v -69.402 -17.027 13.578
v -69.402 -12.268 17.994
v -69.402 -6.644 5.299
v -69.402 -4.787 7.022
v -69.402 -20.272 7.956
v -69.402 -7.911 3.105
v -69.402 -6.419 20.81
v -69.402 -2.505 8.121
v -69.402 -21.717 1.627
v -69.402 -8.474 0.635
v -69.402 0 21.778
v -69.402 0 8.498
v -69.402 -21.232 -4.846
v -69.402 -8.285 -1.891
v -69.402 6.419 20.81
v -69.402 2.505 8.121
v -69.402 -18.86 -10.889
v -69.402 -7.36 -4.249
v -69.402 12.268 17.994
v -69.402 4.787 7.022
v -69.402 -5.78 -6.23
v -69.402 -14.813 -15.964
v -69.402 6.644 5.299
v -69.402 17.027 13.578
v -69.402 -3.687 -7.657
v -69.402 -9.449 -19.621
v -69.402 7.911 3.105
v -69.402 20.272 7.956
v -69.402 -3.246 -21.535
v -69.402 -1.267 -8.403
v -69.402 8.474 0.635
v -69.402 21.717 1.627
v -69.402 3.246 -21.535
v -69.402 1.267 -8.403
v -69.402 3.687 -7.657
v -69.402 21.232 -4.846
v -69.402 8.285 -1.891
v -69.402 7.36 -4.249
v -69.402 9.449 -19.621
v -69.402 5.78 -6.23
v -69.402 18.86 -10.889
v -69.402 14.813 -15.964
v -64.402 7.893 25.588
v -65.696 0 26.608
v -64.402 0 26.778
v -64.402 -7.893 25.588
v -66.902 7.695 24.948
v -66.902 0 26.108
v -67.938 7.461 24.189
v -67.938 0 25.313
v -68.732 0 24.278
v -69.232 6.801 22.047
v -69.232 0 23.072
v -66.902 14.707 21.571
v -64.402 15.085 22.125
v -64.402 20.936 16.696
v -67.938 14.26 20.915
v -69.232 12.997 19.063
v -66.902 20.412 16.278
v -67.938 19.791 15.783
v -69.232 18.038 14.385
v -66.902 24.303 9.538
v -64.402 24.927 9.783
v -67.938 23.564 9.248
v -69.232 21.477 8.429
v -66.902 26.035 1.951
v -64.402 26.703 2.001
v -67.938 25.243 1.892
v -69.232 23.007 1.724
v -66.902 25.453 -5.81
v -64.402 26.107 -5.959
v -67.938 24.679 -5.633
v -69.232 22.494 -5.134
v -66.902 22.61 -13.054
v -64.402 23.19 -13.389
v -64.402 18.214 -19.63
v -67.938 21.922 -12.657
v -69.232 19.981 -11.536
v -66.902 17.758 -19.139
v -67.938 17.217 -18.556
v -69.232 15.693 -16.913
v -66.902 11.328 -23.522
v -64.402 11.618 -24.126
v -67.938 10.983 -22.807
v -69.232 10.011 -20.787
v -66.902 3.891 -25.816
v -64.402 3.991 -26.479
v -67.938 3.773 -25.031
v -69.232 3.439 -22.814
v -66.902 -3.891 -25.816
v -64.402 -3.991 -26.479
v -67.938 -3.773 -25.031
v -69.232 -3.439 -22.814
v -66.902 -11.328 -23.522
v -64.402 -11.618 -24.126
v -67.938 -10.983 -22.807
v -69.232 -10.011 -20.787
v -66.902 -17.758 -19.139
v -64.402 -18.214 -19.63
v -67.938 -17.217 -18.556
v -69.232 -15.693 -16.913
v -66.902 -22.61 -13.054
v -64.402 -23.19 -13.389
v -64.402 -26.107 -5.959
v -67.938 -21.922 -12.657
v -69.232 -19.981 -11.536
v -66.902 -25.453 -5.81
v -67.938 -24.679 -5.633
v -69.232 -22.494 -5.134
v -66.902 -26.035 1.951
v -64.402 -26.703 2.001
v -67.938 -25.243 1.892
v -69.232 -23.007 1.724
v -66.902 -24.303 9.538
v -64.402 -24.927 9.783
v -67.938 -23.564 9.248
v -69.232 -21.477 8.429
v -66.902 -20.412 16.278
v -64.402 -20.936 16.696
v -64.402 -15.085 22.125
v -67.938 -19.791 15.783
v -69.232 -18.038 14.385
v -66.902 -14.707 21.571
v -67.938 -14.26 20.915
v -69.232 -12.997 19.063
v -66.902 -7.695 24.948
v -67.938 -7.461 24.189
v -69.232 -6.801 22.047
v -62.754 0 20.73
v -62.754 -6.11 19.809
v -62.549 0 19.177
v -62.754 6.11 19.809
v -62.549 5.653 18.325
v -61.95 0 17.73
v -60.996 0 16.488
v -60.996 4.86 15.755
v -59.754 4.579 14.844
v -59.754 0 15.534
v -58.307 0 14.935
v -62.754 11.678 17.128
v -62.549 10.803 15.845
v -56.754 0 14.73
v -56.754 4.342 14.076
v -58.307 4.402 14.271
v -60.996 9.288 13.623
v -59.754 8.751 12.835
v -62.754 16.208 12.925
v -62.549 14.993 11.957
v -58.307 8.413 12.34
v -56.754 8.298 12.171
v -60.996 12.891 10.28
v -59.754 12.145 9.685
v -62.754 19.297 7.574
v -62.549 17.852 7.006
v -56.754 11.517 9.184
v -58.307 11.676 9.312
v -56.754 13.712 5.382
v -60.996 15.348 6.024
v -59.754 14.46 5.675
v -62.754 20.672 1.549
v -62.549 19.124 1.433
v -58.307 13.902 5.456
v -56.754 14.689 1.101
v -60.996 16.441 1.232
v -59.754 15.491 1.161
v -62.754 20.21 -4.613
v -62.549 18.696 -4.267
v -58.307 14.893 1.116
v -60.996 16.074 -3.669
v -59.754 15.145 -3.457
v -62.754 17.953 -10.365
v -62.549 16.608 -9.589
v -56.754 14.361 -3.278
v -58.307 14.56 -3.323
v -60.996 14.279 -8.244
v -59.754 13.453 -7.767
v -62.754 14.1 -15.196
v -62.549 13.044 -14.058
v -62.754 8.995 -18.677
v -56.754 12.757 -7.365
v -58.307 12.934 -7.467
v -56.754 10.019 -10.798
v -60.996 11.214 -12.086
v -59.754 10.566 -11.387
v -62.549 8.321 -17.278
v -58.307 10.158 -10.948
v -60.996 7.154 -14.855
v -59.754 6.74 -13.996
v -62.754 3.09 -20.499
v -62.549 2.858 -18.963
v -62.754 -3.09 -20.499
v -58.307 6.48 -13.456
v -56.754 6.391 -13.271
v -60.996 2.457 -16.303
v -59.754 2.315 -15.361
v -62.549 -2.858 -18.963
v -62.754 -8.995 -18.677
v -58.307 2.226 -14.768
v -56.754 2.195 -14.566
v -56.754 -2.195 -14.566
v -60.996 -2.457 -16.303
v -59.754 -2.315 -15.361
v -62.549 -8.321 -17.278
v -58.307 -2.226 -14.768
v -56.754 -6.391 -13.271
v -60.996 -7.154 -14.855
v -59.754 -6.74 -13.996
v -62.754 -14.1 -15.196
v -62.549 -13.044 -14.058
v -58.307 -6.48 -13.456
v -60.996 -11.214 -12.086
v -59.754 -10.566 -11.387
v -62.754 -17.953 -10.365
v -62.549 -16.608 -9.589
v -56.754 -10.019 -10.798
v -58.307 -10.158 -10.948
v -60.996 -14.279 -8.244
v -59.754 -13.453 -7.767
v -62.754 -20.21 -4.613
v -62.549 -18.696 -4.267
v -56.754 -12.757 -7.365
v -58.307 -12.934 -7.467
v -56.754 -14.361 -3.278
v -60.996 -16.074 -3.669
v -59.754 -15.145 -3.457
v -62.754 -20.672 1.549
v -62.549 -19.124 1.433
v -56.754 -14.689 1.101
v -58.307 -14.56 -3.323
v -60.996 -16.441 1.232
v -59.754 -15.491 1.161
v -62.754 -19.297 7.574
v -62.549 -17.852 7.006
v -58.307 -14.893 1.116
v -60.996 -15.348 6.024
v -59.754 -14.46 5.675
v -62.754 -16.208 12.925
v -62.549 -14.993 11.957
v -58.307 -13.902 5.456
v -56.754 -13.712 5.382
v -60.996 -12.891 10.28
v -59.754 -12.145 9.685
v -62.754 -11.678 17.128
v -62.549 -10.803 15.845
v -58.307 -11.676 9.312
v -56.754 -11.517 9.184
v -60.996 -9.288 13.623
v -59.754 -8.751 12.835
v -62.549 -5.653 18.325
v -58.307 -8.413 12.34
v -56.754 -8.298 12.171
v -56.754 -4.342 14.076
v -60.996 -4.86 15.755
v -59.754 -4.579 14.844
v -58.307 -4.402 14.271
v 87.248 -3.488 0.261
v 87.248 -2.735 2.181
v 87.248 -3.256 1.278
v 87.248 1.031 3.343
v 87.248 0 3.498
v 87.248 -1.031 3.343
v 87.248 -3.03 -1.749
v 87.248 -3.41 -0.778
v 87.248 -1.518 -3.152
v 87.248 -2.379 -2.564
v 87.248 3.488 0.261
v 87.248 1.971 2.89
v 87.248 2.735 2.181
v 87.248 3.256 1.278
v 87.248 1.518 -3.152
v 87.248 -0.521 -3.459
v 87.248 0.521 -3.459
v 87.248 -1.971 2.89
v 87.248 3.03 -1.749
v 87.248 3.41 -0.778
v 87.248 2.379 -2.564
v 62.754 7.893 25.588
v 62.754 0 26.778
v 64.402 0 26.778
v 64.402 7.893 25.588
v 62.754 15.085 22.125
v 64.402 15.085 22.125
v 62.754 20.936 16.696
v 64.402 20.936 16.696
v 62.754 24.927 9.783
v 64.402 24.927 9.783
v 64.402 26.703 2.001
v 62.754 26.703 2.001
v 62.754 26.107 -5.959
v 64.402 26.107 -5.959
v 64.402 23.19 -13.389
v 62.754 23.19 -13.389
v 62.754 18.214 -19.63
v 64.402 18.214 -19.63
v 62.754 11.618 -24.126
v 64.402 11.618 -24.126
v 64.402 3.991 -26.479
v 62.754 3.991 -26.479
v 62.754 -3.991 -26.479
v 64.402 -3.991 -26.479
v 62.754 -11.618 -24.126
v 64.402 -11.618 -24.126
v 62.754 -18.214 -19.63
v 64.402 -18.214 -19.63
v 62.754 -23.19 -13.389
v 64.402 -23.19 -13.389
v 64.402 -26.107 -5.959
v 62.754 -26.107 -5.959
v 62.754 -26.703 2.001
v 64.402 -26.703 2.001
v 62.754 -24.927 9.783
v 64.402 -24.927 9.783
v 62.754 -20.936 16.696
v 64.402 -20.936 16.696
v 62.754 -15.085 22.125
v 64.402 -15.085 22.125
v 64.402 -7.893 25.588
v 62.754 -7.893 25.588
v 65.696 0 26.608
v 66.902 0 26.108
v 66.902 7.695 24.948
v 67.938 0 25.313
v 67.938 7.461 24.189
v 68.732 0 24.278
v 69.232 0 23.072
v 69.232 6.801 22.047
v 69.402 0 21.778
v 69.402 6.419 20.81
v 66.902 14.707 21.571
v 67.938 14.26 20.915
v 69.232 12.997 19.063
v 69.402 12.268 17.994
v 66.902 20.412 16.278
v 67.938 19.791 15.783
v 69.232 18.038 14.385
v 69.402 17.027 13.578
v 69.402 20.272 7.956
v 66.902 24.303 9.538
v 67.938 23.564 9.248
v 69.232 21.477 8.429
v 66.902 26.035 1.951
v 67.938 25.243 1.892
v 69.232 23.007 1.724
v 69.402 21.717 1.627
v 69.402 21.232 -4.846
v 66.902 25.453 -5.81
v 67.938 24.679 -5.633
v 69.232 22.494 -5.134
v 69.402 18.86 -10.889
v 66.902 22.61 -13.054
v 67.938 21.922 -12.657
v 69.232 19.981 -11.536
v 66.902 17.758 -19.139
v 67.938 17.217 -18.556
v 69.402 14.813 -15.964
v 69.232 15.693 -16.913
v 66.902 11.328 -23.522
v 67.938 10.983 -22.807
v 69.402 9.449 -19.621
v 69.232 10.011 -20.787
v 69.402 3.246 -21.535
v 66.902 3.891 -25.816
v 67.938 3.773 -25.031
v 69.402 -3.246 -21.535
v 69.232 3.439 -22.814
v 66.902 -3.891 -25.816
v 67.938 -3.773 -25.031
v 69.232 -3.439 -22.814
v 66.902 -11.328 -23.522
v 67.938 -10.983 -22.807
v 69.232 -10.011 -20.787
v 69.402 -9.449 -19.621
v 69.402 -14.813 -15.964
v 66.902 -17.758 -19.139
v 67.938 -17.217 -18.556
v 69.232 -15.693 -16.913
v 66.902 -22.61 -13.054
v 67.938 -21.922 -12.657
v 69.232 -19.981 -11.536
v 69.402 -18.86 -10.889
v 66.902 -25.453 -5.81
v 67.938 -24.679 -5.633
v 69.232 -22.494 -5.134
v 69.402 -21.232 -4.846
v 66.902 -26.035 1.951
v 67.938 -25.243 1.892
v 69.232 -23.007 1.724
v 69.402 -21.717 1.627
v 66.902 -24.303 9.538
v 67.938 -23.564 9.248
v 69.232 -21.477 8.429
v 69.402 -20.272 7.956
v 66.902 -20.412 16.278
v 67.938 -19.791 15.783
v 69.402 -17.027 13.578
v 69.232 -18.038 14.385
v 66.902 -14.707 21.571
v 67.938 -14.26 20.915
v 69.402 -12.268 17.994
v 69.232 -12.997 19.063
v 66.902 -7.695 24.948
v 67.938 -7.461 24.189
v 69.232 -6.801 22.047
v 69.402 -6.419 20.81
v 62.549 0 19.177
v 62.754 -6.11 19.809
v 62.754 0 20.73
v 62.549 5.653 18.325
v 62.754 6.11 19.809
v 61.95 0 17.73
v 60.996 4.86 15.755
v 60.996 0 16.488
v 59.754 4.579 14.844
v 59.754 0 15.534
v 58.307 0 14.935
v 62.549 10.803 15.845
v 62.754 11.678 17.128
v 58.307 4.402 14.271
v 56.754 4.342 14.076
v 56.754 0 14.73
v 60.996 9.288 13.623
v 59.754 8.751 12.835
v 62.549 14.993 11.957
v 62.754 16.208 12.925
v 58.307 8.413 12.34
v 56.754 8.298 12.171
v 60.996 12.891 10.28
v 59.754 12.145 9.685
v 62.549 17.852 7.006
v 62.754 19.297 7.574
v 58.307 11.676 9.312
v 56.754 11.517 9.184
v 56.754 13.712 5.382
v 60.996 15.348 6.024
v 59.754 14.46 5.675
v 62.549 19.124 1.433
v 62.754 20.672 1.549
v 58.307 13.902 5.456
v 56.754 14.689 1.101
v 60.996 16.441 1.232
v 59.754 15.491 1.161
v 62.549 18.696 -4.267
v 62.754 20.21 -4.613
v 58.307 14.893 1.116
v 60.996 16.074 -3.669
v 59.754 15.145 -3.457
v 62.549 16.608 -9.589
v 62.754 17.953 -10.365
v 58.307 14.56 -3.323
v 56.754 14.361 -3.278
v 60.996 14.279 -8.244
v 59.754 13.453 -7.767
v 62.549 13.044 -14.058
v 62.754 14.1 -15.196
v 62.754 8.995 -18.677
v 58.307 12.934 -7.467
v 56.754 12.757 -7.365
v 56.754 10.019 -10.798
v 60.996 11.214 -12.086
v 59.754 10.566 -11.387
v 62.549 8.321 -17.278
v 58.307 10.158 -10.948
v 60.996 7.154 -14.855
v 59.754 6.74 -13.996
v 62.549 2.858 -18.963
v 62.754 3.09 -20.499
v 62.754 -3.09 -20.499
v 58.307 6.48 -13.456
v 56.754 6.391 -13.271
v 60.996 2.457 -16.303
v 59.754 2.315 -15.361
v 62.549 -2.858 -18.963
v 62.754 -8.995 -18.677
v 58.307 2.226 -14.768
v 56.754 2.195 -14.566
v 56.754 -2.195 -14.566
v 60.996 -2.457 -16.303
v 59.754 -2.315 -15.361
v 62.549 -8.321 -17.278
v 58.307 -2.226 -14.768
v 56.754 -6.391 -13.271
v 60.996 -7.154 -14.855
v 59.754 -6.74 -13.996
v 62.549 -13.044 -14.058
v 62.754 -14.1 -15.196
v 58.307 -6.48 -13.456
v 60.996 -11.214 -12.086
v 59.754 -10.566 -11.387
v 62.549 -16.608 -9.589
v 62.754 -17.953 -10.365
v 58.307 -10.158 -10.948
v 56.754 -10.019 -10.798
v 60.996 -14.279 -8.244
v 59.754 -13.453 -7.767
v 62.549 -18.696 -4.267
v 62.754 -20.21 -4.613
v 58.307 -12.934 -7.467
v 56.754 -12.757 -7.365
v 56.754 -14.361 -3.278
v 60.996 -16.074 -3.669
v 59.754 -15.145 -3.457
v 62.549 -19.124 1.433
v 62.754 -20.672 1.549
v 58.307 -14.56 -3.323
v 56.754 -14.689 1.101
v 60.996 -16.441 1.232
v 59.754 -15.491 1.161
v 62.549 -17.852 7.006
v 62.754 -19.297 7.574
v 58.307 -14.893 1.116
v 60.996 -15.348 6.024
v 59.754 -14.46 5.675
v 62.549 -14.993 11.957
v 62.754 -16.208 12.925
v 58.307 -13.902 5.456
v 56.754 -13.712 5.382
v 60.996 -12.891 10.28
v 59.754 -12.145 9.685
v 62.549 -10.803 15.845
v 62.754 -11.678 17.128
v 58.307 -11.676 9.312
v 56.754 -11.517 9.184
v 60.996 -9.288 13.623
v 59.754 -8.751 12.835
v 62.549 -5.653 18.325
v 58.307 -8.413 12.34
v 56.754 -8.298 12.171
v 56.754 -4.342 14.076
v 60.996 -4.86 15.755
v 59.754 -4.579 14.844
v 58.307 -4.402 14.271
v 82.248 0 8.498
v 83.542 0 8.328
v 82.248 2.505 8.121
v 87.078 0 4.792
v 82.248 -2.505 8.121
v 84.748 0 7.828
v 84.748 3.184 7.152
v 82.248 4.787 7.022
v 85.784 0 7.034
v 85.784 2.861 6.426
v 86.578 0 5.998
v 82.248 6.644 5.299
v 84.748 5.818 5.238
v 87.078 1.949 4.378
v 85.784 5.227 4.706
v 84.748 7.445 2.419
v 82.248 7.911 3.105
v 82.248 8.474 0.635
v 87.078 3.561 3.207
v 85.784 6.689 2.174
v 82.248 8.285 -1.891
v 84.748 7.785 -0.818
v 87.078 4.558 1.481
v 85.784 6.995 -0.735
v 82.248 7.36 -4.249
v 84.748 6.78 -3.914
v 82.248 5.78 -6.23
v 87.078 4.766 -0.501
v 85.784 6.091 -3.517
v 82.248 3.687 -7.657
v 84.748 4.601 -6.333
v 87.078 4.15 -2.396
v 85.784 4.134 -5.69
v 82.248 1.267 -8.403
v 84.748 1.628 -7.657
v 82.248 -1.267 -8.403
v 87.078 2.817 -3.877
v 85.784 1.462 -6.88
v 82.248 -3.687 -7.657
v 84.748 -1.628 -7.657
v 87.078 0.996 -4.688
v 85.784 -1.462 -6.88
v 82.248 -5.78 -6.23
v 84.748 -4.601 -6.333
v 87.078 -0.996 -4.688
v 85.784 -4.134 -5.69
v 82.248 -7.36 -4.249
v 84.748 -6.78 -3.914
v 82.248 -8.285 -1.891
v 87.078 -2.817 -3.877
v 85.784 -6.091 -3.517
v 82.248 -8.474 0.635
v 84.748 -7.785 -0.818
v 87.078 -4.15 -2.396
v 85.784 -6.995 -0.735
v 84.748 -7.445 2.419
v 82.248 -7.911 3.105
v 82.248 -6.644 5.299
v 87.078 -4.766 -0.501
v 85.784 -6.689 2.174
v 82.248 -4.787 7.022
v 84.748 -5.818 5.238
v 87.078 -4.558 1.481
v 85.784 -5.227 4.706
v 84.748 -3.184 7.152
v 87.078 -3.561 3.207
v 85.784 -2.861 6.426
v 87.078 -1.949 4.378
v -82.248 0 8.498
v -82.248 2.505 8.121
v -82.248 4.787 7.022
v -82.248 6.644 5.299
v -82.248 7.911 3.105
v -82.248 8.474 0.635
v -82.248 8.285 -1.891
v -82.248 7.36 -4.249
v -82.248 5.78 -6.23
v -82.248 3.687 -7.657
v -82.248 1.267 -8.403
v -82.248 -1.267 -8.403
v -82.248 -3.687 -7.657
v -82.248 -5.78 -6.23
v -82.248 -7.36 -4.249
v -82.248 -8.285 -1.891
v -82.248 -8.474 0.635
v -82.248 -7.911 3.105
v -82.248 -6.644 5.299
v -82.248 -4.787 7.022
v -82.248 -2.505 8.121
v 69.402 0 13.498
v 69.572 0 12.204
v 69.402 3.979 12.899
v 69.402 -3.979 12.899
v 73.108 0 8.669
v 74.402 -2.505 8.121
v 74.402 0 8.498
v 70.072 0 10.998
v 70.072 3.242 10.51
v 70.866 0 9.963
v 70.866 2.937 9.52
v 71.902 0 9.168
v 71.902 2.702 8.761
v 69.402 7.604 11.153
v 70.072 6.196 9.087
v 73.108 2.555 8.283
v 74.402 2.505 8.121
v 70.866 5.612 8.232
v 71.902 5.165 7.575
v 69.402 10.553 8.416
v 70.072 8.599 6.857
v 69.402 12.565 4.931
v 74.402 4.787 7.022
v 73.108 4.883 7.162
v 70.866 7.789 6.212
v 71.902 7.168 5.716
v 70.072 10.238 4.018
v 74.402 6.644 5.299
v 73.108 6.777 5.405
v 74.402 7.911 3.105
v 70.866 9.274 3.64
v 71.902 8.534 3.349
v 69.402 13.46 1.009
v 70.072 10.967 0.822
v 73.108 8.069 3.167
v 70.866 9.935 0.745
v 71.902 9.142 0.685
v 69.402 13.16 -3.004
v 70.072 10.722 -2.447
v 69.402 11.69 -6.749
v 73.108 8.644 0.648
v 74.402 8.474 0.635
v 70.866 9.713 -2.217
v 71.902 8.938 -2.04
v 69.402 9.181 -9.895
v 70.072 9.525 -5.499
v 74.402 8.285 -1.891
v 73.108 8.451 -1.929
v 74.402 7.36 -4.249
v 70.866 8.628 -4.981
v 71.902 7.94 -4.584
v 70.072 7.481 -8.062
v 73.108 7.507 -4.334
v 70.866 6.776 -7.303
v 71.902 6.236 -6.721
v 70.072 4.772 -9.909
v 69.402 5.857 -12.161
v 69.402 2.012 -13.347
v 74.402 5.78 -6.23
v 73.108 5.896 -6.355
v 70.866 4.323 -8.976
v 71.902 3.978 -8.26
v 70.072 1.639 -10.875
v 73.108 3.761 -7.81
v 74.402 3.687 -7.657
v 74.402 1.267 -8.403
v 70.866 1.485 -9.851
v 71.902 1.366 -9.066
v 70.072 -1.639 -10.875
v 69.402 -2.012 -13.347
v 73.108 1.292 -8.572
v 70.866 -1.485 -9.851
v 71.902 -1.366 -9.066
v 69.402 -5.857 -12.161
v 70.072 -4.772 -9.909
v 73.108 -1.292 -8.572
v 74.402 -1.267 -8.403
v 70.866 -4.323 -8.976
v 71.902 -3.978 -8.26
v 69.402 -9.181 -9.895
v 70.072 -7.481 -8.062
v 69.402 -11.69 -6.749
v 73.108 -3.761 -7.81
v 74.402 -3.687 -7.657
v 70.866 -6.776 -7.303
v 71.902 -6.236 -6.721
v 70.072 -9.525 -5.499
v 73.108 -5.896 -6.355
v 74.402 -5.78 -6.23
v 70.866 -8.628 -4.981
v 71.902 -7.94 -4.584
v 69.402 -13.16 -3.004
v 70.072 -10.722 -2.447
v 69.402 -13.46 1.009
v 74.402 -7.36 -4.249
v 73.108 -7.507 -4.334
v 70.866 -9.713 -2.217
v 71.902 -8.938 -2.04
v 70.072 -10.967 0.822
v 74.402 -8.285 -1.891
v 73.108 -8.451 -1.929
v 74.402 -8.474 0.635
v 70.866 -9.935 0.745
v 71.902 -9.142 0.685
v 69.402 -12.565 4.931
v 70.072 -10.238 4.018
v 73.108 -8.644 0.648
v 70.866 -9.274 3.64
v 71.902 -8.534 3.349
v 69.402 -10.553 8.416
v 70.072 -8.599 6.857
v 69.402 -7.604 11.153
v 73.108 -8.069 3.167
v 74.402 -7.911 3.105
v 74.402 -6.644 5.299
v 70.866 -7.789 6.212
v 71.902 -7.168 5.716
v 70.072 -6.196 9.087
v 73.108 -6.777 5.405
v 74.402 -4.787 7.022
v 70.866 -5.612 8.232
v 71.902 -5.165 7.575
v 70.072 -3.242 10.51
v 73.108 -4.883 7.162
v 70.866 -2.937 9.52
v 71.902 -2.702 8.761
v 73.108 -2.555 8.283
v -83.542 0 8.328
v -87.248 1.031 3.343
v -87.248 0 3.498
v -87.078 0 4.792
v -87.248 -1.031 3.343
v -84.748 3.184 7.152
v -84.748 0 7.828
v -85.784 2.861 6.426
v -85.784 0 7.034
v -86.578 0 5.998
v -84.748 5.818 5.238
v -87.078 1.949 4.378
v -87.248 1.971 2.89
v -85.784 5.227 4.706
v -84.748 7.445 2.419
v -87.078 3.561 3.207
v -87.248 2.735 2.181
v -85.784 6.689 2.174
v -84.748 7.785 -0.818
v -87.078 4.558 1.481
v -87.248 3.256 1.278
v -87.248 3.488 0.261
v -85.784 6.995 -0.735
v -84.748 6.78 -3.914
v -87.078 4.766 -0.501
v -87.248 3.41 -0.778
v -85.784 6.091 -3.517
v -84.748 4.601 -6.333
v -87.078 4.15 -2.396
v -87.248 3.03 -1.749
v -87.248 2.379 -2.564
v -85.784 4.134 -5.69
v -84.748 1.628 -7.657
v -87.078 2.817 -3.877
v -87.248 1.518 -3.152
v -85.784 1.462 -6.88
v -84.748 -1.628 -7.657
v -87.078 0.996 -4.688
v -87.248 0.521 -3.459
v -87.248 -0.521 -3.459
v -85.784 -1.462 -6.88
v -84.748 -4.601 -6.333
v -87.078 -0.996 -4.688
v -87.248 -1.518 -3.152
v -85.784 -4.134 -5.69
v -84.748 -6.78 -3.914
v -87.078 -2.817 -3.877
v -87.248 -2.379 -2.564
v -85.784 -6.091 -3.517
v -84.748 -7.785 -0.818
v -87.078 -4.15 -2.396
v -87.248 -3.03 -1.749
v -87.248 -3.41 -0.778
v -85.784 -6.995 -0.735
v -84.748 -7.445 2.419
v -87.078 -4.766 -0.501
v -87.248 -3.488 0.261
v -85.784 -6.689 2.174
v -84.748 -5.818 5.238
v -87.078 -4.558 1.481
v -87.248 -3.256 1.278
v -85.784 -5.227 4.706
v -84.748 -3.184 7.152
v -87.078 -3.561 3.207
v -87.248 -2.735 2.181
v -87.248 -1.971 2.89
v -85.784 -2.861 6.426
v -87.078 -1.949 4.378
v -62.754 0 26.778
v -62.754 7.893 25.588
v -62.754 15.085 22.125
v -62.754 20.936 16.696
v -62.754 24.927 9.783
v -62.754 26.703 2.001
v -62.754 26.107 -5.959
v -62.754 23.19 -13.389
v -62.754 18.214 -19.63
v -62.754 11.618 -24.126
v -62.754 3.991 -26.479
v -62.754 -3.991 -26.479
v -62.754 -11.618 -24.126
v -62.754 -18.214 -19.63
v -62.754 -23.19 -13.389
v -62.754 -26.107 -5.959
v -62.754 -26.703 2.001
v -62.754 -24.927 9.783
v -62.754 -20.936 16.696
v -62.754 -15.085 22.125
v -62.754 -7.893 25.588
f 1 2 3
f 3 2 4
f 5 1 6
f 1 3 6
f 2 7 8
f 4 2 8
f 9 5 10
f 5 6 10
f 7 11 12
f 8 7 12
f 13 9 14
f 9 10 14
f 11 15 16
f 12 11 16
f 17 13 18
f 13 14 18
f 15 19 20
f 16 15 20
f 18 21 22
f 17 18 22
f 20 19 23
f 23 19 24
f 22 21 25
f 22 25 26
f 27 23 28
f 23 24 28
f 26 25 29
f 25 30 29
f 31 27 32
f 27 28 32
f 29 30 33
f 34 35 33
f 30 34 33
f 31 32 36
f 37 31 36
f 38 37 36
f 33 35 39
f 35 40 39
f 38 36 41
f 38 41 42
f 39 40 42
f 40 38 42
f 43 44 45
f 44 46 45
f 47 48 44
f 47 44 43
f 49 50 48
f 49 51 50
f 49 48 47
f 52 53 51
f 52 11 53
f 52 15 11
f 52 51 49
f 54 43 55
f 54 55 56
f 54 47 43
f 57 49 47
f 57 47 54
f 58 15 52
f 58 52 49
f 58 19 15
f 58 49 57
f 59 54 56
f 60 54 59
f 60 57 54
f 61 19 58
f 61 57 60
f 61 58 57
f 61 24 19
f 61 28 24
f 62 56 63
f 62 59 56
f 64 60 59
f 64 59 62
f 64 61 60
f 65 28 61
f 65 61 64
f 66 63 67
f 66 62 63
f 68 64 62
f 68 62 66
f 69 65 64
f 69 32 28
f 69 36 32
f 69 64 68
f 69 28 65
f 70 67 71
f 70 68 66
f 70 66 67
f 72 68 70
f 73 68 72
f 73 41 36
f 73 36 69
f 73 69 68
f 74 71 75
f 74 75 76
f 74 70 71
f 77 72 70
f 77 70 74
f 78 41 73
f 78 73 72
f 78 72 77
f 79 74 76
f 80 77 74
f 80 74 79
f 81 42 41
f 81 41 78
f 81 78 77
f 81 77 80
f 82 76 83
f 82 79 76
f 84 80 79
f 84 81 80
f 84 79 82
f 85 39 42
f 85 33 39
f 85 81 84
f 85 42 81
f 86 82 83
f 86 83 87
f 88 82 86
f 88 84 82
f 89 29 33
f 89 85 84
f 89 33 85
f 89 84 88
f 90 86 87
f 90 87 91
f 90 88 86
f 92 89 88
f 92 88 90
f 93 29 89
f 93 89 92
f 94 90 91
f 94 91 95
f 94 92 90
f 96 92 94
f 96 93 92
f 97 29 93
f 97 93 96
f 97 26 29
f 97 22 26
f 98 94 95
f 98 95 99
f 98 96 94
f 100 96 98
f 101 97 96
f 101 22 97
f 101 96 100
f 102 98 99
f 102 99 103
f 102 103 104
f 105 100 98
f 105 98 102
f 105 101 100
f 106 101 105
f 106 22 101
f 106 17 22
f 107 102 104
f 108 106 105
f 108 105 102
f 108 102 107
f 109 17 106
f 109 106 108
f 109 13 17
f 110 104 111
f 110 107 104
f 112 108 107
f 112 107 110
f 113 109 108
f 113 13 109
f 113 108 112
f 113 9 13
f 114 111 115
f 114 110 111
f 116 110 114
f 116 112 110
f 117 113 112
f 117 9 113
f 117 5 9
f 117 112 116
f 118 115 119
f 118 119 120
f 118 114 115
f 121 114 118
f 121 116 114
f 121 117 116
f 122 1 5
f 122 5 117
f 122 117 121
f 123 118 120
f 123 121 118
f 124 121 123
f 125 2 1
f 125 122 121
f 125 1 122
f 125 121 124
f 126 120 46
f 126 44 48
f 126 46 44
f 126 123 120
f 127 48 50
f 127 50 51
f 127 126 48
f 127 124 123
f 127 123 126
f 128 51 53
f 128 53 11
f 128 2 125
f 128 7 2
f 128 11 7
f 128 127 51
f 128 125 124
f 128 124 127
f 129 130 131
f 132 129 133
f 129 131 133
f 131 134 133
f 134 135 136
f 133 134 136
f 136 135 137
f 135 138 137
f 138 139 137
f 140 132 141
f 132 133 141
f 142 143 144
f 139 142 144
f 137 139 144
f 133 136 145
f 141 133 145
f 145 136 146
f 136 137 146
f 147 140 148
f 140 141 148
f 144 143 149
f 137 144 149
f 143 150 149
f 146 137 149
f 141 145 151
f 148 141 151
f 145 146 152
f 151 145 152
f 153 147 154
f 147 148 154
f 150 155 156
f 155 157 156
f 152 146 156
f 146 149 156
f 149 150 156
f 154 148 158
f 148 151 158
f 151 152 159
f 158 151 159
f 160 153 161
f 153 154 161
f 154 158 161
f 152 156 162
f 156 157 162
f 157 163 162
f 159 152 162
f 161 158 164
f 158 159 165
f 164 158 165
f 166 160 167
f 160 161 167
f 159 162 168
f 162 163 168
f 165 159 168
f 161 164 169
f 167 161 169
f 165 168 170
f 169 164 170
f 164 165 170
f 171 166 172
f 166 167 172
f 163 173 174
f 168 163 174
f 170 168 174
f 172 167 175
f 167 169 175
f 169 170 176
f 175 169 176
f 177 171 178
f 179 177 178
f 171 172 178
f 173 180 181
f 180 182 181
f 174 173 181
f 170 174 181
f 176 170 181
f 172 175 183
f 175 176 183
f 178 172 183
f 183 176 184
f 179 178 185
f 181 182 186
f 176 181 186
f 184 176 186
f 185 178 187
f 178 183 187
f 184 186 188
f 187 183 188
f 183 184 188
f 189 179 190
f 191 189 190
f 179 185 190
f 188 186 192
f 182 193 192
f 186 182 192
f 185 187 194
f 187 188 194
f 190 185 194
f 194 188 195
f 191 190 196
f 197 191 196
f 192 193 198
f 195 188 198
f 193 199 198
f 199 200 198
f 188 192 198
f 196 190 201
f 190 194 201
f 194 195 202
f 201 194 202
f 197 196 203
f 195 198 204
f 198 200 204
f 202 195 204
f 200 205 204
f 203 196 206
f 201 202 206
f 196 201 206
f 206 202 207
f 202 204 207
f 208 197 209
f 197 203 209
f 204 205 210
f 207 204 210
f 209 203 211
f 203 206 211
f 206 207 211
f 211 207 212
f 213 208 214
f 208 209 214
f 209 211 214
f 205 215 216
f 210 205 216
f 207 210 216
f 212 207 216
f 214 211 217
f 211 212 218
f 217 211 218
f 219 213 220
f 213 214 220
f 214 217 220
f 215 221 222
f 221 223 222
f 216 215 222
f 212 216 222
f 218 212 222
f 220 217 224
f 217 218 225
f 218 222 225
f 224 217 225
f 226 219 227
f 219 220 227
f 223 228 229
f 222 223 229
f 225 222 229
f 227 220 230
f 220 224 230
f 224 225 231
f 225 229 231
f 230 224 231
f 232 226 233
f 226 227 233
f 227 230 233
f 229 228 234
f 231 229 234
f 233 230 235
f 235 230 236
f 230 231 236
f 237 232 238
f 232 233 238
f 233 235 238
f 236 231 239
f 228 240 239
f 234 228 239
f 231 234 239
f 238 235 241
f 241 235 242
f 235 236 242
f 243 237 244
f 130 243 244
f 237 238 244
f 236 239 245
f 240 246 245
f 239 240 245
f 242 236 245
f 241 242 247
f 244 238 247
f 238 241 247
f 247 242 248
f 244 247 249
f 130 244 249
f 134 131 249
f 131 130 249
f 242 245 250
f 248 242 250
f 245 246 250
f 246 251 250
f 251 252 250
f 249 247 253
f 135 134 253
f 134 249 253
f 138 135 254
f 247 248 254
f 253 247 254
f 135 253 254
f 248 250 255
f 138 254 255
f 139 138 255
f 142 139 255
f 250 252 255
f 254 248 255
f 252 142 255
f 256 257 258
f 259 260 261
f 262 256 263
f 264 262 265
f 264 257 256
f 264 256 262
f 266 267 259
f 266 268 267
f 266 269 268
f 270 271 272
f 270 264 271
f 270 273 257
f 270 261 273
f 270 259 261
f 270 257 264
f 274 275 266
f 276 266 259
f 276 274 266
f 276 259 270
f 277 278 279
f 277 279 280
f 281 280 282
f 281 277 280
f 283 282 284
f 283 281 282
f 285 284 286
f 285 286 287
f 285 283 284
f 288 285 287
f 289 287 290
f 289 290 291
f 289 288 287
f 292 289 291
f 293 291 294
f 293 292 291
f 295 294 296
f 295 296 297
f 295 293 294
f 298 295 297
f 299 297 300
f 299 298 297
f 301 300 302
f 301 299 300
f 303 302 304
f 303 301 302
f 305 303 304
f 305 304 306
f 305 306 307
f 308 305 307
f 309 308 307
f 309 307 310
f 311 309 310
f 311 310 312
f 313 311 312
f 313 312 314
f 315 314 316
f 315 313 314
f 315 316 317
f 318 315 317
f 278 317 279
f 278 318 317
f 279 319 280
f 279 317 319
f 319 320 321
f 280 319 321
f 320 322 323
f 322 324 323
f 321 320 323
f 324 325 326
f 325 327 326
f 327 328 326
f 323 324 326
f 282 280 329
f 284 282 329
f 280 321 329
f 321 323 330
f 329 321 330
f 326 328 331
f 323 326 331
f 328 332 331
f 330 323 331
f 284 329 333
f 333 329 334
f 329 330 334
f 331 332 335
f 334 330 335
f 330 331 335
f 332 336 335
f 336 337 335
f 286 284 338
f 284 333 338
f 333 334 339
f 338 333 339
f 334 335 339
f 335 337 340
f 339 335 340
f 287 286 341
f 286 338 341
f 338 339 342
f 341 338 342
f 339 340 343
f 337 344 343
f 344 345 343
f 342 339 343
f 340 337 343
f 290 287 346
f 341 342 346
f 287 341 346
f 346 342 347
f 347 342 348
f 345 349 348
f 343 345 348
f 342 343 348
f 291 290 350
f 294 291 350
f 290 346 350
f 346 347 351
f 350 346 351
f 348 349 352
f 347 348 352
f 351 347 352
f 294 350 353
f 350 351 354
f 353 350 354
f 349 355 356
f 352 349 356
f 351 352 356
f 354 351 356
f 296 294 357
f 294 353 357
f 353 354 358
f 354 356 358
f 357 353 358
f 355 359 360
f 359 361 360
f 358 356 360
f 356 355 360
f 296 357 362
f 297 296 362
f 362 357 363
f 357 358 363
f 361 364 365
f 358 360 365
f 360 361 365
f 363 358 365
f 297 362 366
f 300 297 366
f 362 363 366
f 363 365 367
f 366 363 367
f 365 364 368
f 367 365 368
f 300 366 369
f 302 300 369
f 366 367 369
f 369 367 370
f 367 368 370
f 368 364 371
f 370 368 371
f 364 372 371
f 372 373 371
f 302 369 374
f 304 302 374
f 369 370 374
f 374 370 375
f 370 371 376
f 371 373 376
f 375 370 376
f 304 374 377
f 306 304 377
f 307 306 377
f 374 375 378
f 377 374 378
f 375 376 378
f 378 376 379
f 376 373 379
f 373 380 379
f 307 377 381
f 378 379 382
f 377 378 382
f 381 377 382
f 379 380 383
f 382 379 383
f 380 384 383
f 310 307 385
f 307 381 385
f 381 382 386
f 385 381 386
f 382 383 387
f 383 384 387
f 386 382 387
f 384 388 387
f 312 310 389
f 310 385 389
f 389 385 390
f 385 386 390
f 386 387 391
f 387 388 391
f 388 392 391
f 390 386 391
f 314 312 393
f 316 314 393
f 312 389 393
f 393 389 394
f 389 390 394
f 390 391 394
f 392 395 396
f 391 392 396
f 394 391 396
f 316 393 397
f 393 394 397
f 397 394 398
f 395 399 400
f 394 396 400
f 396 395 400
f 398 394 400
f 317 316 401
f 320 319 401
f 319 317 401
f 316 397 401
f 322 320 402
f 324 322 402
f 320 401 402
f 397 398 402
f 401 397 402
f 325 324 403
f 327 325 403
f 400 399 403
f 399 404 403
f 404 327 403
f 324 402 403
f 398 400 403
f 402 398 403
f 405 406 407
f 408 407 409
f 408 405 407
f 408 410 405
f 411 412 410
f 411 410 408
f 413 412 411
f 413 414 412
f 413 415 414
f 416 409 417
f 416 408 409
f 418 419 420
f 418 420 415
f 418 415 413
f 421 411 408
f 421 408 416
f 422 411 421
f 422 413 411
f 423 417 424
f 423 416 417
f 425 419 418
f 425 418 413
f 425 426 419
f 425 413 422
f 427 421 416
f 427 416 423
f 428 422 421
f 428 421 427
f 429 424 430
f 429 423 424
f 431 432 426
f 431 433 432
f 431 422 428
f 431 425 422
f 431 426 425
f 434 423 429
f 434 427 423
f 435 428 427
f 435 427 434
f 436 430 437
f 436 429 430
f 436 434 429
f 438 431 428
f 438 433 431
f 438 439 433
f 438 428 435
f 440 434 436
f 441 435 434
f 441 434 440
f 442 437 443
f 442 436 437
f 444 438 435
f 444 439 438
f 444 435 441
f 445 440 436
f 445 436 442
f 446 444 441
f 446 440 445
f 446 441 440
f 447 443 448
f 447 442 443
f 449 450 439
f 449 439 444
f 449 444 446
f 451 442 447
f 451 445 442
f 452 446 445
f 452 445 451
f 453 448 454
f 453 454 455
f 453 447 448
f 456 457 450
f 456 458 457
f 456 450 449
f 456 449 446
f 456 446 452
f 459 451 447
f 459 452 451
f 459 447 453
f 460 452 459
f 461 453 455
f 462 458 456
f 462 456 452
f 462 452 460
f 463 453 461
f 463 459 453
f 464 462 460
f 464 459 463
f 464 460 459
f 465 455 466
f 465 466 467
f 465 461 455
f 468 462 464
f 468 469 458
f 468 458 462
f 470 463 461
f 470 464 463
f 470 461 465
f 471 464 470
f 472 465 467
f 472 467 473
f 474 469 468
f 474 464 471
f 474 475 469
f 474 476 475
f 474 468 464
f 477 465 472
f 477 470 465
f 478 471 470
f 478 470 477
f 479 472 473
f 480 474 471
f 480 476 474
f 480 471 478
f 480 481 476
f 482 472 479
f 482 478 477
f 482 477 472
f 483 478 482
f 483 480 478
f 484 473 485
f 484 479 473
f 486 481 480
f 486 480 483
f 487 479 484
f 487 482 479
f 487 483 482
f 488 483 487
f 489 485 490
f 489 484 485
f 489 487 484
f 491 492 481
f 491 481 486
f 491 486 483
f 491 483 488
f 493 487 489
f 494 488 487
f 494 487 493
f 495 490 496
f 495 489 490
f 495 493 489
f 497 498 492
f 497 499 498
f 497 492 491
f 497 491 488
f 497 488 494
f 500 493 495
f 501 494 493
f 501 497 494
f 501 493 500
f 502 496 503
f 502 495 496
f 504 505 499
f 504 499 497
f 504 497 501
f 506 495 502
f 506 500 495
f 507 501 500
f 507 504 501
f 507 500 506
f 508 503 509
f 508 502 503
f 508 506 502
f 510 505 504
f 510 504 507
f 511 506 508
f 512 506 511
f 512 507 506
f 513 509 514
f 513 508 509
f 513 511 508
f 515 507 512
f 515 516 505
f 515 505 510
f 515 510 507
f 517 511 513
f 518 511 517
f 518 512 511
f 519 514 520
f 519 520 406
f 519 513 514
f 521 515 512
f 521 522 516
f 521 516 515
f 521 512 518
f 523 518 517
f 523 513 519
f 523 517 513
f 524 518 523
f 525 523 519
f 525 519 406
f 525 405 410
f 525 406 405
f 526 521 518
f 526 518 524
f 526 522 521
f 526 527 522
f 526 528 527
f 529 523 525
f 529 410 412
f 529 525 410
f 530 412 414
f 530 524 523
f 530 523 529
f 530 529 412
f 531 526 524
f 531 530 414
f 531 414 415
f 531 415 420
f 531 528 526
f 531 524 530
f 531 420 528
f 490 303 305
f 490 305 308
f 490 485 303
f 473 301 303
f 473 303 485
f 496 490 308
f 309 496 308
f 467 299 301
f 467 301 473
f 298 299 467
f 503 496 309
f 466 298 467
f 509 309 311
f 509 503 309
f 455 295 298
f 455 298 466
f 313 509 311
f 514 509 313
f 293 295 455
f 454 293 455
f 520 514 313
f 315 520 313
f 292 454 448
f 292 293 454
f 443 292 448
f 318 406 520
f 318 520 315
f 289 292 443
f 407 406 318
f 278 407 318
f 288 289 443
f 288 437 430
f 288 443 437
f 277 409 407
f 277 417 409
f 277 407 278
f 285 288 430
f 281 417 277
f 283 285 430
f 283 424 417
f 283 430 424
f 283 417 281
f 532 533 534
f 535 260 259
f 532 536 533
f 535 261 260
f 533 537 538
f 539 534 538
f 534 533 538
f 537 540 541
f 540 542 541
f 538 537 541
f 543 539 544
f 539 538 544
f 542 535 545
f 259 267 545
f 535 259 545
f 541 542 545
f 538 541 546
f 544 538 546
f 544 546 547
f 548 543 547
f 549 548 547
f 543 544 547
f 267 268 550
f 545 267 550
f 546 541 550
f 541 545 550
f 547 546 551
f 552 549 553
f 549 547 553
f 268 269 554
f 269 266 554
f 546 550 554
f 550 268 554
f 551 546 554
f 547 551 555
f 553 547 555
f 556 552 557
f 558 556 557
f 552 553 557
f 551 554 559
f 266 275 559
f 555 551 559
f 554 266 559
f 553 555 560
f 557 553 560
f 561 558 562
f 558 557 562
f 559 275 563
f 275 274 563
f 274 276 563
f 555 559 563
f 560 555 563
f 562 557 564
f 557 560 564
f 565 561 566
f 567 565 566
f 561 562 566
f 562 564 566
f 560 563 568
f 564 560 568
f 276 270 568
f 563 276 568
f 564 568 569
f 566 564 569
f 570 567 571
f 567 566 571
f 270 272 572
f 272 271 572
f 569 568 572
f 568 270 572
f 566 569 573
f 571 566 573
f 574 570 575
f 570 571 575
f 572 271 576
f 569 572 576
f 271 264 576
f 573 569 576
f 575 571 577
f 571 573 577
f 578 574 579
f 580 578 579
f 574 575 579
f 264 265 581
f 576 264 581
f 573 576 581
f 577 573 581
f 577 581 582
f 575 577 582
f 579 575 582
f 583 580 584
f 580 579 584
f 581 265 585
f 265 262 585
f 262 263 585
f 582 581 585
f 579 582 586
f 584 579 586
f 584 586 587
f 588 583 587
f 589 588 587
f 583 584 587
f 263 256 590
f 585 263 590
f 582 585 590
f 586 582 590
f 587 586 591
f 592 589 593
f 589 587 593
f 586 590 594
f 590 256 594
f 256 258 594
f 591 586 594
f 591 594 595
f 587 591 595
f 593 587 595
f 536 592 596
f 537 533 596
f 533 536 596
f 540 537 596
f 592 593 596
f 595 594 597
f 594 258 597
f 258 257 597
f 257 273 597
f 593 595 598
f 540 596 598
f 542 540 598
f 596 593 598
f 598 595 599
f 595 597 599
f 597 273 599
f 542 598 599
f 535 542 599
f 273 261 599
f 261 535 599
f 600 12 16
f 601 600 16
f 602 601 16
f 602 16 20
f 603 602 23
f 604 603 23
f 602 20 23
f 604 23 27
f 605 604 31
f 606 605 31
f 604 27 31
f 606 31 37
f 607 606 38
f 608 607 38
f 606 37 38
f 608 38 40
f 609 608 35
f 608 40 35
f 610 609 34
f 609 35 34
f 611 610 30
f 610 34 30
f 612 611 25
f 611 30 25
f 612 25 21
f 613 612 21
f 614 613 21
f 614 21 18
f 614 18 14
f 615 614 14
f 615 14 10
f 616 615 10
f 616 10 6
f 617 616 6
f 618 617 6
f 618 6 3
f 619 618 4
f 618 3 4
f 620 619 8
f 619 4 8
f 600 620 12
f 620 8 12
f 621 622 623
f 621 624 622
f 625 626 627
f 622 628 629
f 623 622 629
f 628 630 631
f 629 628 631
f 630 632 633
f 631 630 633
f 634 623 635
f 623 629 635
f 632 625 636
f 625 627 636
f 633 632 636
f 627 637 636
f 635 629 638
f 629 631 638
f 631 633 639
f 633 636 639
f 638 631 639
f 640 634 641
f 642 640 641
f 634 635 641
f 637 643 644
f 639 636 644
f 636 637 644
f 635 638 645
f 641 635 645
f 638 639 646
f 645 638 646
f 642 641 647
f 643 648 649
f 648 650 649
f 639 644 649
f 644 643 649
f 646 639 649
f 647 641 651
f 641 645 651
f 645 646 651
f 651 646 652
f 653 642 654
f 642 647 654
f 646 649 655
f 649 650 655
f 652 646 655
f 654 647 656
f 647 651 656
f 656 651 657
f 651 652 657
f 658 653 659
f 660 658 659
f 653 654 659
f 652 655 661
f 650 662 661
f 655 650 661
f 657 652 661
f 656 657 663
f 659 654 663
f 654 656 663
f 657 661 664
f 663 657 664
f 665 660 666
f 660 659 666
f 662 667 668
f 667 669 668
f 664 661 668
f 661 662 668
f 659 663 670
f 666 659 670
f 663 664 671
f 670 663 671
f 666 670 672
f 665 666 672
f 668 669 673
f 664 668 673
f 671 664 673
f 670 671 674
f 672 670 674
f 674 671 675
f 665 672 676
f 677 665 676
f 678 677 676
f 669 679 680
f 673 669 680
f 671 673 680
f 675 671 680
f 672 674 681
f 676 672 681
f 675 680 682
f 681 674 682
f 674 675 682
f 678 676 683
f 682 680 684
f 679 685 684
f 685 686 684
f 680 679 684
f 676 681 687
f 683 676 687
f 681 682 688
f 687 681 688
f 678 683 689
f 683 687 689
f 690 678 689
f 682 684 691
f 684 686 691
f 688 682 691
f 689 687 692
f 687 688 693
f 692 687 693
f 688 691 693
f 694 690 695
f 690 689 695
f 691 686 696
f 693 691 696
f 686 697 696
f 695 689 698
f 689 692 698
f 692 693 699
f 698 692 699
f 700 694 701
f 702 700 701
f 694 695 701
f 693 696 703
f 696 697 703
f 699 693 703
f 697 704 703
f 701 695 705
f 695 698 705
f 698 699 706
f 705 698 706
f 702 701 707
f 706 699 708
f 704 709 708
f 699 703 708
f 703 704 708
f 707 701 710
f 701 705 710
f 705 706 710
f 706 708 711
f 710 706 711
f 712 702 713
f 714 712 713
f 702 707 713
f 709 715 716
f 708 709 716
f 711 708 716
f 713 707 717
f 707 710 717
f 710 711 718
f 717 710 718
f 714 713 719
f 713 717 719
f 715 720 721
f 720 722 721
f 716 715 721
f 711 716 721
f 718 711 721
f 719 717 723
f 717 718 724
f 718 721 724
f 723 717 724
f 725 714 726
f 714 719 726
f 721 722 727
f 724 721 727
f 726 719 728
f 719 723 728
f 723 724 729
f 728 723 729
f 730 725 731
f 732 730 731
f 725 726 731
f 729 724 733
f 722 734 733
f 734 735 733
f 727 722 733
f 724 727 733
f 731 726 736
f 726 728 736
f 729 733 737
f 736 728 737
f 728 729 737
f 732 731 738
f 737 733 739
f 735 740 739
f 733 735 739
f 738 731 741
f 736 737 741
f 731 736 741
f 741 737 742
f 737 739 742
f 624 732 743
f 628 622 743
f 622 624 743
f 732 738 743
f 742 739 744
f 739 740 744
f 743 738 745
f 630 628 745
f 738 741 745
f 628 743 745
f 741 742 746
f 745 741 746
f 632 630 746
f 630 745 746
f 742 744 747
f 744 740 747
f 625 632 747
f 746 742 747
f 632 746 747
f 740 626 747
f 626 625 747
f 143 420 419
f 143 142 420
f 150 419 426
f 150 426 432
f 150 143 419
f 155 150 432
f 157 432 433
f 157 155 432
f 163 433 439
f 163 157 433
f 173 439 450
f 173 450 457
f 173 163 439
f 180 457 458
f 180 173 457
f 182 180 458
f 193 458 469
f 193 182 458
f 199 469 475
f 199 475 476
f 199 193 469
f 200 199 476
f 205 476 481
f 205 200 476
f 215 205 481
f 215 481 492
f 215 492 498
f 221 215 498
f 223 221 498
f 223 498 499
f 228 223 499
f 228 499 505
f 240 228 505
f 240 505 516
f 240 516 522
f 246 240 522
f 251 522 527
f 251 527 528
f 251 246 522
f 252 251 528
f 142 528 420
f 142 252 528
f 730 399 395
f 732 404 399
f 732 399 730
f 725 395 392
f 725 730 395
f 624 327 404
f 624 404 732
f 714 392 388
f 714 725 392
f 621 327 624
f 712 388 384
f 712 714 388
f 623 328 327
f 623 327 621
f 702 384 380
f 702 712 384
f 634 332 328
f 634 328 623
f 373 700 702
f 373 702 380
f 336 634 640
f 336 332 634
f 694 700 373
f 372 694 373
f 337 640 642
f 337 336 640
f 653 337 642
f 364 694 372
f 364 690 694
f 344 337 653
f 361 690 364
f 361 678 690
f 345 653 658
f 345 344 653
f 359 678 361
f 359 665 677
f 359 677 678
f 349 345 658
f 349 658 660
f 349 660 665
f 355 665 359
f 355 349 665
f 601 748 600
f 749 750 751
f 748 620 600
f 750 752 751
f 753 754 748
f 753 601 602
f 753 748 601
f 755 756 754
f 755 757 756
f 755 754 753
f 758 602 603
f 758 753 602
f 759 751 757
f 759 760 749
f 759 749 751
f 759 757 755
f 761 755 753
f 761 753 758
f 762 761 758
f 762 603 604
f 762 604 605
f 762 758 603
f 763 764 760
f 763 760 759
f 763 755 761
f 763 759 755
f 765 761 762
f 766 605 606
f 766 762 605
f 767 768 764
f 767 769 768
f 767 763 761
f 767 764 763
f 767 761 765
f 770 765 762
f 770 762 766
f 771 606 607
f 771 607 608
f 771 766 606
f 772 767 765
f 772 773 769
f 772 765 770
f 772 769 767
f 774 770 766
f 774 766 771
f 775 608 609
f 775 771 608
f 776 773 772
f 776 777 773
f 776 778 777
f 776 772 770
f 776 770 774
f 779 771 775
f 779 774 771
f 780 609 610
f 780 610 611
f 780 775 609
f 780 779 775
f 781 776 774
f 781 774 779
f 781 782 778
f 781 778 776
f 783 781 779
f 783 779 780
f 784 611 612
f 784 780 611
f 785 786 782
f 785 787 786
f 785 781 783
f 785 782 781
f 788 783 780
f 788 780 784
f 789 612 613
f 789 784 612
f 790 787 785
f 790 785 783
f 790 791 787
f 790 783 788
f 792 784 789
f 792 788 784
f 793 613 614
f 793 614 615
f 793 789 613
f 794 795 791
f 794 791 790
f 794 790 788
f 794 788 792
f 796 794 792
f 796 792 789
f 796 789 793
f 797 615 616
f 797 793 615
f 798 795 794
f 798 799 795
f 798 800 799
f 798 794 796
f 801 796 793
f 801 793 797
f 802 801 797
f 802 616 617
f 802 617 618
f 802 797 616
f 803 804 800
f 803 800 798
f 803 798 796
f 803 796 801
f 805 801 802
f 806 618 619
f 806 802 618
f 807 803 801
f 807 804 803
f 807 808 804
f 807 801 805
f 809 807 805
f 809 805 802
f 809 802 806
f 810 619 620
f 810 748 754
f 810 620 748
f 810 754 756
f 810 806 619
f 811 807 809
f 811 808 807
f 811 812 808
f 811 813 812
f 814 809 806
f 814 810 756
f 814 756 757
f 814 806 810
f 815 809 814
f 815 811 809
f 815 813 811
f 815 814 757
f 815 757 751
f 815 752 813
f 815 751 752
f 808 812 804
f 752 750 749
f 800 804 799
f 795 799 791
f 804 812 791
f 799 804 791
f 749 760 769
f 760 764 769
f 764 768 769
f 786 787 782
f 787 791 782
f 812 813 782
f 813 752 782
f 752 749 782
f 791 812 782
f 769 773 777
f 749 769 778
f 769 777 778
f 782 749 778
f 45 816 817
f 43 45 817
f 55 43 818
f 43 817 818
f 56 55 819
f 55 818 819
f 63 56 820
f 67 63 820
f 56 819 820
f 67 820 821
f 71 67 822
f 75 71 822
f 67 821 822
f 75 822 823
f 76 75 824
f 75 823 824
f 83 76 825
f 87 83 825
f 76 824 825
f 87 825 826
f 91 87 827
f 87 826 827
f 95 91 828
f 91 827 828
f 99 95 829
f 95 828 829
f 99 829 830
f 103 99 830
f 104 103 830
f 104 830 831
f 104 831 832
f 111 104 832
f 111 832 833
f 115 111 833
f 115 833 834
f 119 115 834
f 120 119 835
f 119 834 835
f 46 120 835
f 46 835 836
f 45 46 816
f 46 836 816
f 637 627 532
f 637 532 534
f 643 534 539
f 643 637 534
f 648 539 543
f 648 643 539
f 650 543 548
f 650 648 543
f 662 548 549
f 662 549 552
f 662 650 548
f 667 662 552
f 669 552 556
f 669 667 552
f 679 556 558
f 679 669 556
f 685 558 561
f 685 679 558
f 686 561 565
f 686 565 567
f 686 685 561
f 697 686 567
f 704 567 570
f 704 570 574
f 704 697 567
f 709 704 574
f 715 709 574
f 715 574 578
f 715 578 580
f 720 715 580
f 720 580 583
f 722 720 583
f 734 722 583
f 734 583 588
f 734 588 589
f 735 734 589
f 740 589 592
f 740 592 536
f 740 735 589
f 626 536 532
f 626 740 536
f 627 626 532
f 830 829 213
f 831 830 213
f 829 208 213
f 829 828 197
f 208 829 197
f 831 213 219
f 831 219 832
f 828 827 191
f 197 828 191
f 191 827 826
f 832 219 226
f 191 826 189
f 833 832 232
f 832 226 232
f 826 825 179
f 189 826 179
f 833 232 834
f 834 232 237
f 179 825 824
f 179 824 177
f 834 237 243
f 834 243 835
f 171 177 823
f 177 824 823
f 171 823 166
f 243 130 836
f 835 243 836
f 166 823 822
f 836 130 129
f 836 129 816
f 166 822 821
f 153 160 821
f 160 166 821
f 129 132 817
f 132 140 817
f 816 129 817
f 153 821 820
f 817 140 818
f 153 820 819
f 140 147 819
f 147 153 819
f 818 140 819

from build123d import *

# Parameters (mm, degrees)
F3_R = 5
F4_R = 5


with BuildPart() as f1:
    # F0 (on Front) → F1 (revolve)
    with BuildSketch(Plane.XZ):
        with BuildLine():
            Line((56.7536008358, 14.730216004), (0, 14.730216004))
            Line((0, 14.730216004), (0, 0))
            Line((0, 0), (87.248198688, 0))
            Line((87.248198688, 0), (87.248198688, 8.4982011467))
            Line((87.248198688, 8.4982011467), (69.4019794464, 8.4982011467))
            Line((69.4019794464, 8.4982011467), (69.4019794464, 11.7778782398))
            Line((69.4019794464, 11.7778782398), (69.4019794464, 26.7778782398))
            Line((69.4019794464, 26.7778782398), (62.7536008358, 26.7778782398))
            Line((62.7536008358, 26.7778782398), (62.7536008358, 20.730216004))
            ThreePointArc((62.7536008358, 20.730216004), (60.9962415229, 16.4875753168), (56.7536008358, 14.730216004))
        make_face()
    revolve(axis=Axis((43.624099344, 0, 0), (-1, 0, 0)))

    # F2: F1 across face


with BuildPart() as f1_1:
    add(f1.part)
    add(f1.part.mirror(Plane(origin=(0, 0, 0), x_dir=(0, -1, 0), z_dir=(-1, 0, 0))))

    # F3
    f3_edges = [f1_1.edges().sort_by_distance(p)[0] for p in [
        (-87.248199, 0, -8.498201),
        (-69.401979, 0, -26.777878),
    ]]
    fillet(f3_edges, radius=F3_R)

    # F4
    f4_edges = [f1_1.edges().sort_by_distance(p)[0] for p in [
        (69.401979, 0, -26.777878),
        (69.401979, 0, -8.498201),
        (87.248199, 0, -8.498201),
    ]]
    fillet(f4_edges, radius=F4_R)


solid = f1_1.part
